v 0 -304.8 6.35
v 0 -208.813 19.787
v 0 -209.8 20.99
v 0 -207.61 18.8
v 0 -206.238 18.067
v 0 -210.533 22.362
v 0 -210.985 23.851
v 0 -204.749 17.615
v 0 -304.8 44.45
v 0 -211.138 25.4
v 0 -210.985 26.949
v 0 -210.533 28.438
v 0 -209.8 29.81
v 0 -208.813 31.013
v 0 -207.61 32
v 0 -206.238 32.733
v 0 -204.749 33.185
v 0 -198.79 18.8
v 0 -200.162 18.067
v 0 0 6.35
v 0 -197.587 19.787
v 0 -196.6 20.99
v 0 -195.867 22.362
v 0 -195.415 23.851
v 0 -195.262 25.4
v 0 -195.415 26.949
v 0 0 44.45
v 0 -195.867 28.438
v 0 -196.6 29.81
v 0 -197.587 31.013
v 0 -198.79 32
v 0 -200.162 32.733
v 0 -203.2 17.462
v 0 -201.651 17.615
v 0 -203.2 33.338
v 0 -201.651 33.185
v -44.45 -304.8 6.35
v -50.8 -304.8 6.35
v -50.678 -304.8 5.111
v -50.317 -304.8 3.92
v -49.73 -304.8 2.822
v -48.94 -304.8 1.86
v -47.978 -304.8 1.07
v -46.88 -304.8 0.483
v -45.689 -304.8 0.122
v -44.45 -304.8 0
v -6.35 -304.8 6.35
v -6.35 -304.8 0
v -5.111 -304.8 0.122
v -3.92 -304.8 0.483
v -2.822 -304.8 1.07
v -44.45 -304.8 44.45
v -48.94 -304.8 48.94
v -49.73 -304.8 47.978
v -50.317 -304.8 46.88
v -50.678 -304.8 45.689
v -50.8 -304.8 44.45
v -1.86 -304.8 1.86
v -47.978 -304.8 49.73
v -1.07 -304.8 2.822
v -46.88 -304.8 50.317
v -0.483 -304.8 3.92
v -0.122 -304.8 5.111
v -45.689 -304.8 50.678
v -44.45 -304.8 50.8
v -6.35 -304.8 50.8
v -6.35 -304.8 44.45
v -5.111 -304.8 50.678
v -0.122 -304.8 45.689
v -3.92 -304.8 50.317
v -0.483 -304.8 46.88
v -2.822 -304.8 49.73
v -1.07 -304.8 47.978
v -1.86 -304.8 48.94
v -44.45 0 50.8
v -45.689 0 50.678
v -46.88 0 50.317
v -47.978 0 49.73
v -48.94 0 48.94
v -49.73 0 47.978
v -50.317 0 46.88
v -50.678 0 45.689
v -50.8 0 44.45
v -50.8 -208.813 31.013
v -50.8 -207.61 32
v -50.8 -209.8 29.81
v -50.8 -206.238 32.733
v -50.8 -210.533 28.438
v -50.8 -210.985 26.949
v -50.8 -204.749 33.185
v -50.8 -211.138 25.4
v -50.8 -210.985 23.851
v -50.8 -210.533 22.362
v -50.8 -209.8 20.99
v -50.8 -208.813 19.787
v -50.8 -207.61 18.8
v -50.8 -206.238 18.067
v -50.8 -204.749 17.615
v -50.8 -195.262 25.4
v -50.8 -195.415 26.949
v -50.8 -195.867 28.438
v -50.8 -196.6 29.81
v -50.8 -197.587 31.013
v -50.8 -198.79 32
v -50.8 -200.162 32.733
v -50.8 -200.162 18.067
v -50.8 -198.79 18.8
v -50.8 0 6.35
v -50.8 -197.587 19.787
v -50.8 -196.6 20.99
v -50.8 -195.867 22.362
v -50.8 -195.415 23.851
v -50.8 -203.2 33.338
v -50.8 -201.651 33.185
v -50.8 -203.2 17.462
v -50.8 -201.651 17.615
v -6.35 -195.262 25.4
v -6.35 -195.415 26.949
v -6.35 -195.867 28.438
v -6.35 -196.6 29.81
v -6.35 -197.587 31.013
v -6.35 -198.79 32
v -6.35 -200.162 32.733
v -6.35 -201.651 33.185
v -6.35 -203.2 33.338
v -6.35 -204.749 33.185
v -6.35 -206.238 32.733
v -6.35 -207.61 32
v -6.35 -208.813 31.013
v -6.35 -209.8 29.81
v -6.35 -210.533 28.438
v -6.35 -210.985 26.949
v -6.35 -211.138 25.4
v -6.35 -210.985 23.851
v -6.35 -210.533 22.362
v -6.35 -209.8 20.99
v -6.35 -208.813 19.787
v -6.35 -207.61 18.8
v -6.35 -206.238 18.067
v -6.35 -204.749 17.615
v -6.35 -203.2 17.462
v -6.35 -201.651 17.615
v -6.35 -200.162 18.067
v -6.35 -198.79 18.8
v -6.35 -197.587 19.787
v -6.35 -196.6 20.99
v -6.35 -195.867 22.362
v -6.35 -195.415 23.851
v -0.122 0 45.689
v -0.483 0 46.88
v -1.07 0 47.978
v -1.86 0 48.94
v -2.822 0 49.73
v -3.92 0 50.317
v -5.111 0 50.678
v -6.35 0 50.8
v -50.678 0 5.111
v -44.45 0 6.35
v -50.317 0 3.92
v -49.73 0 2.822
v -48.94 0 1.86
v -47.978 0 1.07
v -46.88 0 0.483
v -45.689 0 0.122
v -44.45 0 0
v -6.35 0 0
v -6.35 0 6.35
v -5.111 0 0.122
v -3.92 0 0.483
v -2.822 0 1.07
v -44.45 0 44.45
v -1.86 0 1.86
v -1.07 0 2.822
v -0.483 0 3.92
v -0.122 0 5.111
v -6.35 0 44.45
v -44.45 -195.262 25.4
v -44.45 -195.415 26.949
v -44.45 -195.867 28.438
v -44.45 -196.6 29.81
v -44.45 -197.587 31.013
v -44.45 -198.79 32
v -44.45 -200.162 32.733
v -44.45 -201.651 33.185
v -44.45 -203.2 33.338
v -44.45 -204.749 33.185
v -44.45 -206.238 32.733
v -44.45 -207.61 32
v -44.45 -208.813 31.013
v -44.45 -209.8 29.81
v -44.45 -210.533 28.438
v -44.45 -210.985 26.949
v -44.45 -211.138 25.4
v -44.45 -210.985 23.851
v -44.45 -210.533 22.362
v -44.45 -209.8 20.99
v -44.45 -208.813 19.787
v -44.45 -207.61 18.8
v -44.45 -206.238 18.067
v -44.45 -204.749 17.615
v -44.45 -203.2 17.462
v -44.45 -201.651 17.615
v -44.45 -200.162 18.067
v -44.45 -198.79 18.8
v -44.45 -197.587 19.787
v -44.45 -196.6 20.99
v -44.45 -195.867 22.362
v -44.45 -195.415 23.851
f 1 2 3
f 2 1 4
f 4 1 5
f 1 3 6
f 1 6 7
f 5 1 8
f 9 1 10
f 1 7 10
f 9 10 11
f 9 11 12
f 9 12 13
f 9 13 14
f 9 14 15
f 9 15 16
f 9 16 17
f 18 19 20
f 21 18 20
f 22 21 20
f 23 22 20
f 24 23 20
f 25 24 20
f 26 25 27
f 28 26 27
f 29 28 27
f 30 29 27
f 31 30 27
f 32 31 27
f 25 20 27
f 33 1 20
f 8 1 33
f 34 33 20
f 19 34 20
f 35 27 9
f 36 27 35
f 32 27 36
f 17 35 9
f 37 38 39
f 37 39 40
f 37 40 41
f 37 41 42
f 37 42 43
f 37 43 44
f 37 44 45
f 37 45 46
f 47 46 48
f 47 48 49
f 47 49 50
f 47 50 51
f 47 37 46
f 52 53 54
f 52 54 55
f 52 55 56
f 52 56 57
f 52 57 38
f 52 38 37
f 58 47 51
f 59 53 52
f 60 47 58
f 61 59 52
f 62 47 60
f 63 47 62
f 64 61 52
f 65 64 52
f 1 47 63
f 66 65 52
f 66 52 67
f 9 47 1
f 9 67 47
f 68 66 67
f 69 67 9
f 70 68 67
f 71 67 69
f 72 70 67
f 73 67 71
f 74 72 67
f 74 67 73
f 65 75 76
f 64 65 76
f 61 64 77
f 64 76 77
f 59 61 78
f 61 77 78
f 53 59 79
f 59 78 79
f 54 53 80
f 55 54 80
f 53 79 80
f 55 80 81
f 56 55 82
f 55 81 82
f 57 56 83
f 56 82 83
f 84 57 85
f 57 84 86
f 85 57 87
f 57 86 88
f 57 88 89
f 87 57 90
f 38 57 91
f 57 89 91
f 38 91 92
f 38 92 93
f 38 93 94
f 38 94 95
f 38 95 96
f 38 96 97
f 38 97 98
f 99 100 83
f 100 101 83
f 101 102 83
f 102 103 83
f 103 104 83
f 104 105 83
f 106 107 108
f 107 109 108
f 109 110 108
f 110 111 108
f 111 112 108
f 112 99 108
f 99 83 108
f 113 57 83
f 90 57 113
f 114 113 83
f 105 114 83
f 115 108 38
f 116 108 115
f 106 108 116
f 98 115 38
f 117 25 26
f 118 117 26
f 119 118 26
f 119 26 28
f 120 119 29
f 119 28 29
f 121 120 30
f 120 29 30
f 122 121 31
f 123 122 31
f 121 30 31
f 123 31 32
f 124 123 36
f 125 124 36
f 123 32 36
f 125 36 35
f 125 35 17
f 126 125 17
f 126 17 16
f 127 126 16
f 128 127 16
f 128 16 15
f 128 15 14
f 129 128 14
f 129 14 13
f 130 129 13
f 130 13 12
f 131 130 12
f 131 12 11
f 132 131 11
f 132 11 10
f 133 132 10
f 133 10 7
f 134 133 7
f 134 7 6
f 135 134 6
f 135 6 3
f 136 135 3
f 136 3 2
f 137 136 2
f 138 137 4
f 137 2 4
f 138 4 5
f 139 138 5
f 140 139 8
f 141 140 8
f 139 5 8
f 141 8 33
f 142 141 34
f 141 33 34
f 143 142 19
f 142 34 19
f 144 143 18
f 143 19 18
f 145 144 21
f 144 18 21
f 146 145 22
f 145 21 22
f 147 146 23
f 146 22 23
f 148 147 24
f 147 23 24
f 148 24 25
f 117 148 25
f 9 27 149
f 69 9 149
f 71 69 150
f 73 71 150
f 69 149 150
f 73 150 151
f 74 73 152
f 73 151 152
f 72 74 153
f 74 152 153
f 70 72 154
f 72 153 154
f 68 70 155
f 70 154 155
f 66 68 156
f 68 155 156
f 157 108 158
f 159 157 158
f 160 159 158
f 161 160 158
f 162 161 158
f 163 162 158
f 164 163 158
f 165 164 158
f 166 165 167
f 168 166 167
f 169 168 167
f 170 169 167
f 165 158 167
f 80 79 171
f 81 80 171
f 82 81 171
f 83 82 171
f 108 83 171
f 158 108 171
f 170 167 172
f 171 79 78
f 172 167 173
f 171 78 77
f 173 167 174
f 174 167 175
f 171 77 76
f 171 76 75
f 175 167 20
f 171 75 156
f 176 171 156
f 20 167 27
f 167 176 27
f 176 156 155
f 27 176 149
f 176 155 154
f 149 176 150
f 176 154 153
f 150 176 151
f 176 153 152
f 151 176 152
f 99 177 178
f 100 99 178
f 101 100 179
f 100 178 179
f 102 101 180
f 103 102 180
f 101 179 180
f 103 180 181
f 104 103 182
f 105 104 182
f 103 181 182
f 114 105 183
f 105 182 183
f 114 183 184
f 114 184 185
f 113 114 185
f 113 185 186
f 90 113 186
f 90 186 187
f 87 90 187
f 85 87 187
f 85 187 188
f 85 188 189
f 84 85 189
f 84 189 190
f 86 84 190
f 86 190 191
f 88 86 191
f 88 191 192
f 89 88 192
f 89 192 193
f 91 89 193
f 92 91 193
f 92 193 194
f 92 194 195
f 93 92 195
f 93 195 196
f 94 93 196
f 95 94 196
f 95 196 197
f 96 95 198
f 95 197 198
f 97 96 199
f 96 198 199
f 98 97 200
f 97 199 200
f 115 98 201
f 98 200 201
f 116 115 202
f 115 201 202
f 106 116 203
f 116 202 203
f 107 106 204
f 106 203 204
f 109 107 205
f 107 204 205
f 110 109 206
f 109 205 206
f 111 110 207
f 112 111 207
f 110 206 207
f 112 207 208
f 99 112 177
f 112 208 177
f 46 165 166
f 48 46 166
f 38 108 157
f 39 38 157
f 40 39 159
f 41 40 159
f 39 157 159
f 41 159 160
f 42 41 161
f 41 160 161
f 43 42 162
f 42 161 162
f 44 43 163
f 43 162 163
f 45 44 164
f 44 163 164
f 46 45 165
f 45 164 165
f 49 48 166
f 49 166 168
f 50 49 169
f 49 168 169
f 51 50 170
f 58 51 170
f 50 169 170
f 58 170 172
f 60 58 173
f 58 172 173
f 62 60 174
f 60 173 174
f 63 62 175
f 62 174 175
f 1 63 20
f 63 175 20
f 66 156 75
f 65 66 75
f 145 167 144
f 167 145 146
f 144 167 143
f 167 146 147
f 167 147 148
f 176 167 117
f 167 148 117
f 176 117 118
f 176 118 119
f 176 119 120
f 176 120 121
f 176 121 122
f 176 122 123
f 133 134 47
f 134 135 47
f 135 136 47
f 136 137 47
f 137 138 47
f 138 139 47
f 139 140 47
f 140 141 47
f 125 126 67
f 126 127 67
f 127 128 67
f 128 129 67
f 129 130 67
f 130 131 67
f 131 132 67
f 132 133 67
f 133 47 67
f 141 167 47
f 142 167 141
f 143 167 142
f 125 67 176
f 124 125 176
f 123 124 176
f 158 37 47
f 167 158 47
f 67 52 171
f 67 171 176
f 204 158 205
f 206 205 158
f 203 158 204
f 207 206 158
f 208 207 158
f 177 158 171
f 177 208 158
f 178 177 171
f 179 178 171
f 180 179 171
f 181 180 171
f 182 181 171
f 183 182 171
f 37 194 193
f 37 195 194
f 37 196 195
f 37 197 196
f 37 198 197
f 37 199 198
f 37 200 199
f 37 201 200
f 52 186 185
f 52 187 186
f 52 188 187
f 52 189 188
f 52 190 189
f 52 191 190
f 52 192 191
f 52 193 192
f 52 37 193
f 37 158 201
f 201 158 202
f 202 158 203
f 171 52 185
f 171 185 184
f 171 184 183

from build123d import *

# Parameters (mm, degrees)
F1_DEPTH = 304.8
F2_W     = 38.1
F2_H     = 38.1
F3_DEPTH = 304.8
F4_R     = 7.9375
F5_DEPTH = 50.8


with BuildPart() as f1:
    # F0 (on Front) → F1 (new body)
    with BuildSketch(Plane.XZ):
        with BuildLine():
            Line((-44.45, 0), (-6.35, 0))
            ThreePointArc((-6.35, 0), (-1.859872, 1.859872), (0, 6.35))
            Line((0, 6.35), (0, 44.45))
            ThreePointArc((0, 44.45), (-1.859872, 48.940128), (-6.35, 50.8))
            Line((-6.35, 50.8), (-44.45, 50.8))
            ThreePointArc((-44.45, 50.8), (-48.940128, 48.940128), (-50.8, 44.45))
            Line((-50.8, 44.45), (-50.8, 6.35))
            ThreePointArc((-50.8, 6.35), (-48.940128, 1.859872), (-44.45, 0))
        make_face()
    extrude(amount=F1_DEPTH)

    # F2 (on face) → F3 (cut)
    with BuildSketch(Plane.XZ.offset(304.8)):
        with Locations((-25.4, 25.4)):
            Rectangle(F2_W, F2_H)
    extrude(amount=-F3_DEPTH, mode=Mode.SUBTRACT)

    # F4 (on face) → F5 (cut)
    with BuildSketch(Plane.YZ):
        with Locations((-203.2, 25.4)):
            Circle(F4_R)
    extrude(amount=-F5_DEPTH, mode=Mode.SUBTRACT)


solid = f1.part
